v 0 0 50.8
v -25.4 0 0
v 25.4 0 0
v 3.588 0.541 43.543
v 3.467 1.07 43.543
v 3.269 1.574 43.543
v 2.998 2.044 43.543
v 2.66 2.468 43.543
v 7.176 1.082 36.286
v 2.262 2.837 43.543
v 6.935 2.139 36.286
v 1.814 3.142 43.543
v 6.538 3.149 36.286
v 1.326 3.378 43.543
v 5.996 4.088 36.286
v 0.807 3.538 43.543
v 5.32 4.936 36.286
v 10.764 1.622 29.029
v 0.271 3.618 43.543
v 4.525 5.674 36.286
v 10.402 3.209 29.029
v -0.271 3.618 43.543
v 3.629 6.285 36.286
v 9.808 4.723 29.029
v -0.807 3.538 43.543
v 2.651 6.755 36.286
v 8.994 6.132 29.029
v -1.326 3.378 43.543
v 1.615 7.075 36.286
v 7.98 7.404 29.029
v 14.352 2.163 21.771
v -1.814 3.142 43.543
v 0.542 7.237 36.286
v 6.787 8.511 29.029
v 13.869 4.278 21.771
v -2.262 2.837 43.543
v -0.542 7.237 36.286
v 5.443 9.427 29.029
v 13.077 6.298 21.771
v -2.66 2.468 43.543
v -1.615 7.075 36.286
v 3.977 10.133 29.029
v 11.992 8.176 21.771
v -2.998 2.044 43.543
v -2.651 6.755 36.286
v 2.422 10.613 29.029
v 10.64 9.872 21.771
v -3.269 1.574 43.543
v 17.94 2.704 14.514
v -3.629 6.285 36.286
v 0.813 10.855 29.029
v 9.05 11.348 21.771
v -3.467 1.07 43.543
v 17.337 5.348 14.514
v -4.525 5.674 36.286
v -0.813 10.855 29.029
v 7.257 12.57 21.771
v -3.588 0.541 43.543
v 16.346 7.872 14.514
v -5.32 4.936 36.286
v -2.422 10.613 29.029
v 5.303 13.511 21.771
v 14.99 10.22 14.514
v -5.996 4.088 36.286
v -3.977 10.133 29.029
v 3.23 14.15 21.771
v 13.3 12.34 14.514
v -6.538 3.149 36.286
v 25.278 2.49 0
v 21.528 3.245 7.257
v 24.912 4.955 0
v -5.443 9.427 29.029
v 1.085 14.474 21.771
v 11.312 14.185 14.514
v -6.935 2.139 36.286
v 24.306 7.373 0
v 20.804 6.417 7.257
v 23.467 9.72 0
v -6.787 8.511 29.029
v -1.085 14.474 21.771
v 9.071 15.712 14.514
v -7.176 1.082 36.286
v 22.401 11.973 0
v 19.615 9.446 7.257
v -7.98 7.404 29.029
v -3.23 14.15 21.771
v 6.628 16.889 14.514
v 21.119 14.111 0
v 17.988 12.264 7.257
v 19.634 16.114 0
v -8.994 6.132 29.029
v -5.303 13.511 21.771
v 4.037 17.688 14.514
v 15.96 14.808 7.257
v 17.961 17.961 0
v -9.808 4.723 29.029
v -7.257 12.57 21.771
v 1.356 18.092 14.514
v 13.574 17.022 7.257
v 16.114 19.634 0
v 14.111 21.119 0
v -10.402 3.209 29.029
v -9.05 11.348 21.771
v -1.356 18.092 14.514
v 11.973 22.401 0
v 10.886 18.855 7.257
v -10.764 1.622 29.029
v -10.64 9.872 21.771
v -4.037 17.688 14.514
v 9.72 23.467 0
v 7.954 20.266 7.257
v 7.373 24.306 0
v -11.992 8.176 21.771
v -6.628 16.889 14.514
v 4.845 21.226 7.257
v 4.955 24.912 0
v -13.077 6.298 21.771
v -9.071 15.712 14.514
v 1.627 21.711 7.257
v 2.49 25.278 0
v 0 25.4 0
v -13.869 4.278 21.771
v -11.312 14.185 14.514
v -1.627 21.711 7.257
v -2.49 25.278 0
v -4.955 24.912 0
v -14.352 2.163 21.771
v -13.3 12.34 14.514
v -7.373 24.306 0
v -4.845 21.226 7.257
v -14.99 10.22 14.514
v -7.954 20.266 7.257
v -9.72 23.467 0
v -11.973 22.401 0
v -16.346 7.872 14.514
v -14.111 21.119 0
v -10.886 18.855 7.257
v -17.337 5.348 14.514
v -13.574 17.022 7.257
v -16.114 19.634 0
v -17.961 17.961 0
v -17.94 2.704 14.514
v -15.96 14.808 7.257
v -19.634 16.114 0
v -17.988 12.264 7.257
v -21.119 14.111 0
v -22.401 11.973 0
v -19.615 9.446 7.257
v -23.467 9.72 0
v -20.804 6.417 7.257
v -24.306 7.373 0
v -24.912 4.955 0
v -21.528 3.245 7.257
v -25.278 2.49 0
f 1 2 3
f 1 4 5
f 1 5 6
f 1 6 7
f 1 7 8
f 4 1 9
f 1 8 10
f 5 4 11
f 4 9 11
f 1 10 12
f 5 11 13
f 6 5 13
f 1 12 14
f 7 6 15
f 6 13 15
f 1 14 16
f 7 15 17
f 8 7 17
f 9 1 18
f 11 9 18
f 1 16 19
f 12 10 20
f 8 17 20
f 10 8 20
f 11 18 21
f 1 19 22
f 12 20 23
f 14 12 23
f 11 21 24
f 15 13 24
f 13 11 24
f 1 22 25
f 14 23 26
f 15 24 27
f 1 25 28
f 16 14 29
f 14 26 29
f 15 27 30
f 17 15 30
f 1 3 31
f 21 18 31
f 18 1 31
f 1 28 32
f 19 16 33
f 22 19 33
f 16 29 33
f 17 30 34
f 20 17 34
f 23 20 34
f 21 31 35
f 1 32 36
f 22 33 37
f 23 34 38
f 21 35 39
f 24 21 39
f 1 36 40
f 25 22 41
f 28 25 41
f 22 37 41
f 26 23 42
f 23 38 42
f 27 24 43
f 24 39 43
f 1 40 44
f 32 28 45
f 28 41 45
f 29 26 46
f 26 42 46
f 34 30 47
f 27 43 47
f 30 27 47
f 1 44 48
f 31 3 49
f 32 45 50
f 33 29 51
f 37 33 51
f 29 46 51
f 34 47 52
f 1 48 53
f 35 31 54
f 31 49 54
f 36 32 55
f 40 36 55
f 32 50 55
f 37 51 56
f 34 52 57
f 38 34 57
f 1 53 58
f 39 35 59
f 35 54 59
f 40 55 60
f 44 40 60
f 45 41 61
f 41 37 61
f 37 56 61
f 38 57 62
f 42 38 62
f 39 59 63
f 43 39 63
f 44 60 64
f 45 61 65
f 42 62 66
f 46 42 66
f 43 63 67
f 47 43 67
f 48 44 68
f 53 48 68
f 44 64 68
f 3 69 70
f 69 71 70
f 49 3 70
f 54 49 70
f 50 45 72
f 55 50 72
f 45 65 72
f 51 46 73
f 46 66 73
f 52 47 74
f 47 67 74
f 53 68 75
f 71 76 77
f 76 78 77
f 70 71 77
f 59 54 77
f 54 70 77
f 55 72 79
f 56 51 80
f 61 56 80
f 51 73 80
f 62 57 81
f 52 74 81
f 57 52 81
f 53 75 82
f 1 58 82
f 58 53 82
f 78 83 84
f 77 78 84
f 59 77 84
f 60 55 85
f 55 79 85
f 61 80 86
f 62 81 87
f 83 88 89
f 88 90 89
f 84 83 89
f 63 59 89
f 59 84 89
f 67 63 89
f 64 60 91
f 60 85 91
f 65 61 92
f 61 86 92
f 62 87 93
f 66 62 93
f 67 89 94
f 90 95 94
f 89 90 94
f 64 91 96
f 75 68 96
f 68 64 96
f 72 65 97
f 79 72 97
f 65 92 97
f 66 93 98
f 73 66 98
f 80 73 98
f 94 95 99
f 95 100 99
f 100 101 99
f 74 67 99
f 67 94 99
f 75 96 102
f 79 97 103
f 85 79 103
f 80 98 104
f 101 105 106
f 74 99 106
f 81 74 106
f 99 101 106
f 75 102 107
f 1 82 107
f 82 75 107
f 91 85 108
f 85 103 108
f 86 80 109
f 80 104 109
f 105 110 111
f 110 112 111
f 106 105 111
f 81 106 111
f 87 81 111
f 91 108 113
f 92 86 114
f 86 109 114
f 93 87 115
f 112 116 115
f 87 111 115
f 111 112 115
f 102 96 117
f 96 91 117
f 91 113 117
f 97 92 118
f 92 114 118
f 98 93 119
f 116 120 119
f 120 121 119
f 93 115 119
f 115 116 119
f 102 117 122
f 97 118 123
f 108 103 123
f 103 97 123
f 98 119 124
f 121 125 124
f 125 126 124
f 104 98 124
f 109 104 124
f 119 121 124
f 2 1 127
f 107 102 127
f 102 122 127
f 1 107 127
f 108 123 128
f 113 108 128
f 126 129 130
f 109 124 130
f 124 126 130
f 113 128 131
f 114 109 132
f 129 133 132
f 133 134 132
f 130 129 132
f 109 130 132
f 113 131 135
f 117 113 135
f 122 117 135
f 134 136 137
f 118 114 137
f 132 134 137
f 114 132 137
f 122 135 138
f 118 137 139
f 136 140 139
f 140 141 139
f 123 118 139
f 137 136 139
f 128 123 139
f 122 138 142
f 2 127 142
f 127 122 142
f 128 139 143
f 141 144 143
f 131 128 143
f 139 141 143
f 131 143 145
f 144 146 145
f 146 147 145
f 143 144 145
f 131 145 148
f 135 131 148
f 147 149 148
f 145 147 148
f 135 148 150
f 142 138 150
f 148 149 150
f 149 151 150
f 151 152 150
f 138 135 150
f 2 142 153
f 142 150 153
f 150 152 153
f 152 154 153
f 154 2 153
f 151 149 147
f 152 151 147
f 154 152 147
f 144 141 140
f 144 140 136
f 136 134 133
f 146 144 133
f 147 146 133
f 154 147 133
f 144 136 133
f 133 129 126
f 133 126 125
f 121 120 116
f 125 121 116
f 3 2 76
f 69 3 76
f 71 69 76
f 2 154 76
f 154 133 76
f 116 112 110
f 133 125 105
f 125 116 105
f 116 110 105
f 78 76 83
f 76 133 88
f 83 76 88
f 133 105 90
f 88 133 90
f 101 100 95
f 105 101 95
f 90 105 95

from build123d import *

# Parameters (mm, degrees)
F0_R     = 25.4
F1_DEPTH = 50.8
F2_SIZE2 = 50.79999
F2_SIZE  = 25.39999
F3_W     = 50.8
F3_H     = 25.4
F4_DEPTH = 101


# Not quite as in the source:
# - a fillet or chamfer is up to 0.001 mm smaller than in the source, because OpenCascade refuses the exact size
# - an extrude ends at something that could not be found from the text; its depth is read off the source's solid


with BuildPart() as f1:
    # F0 (on Top) → F1 (new body)
    with BuildSketch(Plane.XY):
        Circle(F0_R)
    extrude(amount=F1_DEPTH)

    # F2 (size 25.4 and 50.8 in the source; OpenCascade refuses exactly that, so slightly less here)
    f2_edges = [f1.edges().sort_by_distance(p)[0] for p in [
        (-25.4, 0, 50.8),
    ]]
    f2_side = f1.faces().sort_by_distance((0, 0, 50.8))[0]
    chamfer(f2_edges, length=F2_SIZE, length2=F2_SIZE2, reference=f2_side)

    # F3 (on face) → F4 (cut, through all)
    with BuildSketch(Plane(origin=(0, 0, 0), x_dir=(1, 0, 0), z_dir=(0, 0, -1))):
        with Locations((0, 12.7)):
            Rectangle(F3_W, F3_H)
    extrude(amount=-F4_DEPTH, mode=Mode.SUBTRACT)


solid = f1.part
